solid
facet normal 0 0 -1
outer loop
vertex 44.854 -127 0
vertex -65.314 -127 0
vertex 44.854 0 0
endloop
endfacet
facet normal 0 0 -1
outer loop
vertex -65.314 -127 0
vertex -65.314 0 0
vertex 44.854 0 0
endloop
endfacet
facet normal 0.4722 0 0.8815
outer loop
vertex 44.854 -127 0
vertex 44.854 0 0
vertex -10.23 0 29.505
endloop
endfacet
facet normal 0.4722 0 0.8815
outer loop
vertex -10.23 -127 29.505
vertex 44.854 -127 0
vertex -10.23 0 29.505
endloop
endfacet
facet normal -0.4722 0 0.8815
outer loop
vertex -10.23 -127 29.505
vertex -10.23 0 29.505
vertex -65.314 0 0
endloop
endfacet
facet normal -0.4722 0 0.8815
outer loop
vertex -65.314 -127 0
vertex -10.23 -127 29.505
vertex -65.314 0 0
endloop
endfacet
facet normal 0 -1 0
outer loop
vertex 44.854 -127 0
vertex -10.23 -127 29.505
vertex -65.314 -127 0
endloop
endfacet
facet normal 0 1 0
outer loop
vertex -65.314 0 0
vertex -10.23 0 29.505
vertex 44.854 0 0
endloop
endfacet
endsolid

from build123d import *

# Parameters (mm, degrees)
F1_DEPTH = 25.4
F2_DEPTH = 25.4
F3_DEPTH = 76.2


with BuildPart() as f1:
    # F0 (on Front) → F1 (new body)
    with BuildSketch(Plane.XZ):
        Polygon((-10.2298520505, 29.5050740242), (-65.3136447072, 0), (-10.2298520505, 0), align=None)
        Polygon((-10.2298520505, 29.5050740242), (-10.2298520505, 0), (44.8539443314, 0), align=None)
    extrude(amount=F1_DEPTH)

    # F2 (add): a face of the model
    f2_faces = [f1.faces().sort_by_distance(p)[0] for p in [
        (-10.2298508088, -25.4, 9.8350246747),
    ]]
    extrude(f2_faces, amount=F2_DEPTH)

    # F3 (add): a face of the model
    f3_faces = [f1.faces().sort_by_distance(p)[0] for p in [
        (-10.2298508088, -50.8, 9.8350246747),
    ]]
    extrude(f3_faces, amount=F3_DEPTH)


solid = f1.part
